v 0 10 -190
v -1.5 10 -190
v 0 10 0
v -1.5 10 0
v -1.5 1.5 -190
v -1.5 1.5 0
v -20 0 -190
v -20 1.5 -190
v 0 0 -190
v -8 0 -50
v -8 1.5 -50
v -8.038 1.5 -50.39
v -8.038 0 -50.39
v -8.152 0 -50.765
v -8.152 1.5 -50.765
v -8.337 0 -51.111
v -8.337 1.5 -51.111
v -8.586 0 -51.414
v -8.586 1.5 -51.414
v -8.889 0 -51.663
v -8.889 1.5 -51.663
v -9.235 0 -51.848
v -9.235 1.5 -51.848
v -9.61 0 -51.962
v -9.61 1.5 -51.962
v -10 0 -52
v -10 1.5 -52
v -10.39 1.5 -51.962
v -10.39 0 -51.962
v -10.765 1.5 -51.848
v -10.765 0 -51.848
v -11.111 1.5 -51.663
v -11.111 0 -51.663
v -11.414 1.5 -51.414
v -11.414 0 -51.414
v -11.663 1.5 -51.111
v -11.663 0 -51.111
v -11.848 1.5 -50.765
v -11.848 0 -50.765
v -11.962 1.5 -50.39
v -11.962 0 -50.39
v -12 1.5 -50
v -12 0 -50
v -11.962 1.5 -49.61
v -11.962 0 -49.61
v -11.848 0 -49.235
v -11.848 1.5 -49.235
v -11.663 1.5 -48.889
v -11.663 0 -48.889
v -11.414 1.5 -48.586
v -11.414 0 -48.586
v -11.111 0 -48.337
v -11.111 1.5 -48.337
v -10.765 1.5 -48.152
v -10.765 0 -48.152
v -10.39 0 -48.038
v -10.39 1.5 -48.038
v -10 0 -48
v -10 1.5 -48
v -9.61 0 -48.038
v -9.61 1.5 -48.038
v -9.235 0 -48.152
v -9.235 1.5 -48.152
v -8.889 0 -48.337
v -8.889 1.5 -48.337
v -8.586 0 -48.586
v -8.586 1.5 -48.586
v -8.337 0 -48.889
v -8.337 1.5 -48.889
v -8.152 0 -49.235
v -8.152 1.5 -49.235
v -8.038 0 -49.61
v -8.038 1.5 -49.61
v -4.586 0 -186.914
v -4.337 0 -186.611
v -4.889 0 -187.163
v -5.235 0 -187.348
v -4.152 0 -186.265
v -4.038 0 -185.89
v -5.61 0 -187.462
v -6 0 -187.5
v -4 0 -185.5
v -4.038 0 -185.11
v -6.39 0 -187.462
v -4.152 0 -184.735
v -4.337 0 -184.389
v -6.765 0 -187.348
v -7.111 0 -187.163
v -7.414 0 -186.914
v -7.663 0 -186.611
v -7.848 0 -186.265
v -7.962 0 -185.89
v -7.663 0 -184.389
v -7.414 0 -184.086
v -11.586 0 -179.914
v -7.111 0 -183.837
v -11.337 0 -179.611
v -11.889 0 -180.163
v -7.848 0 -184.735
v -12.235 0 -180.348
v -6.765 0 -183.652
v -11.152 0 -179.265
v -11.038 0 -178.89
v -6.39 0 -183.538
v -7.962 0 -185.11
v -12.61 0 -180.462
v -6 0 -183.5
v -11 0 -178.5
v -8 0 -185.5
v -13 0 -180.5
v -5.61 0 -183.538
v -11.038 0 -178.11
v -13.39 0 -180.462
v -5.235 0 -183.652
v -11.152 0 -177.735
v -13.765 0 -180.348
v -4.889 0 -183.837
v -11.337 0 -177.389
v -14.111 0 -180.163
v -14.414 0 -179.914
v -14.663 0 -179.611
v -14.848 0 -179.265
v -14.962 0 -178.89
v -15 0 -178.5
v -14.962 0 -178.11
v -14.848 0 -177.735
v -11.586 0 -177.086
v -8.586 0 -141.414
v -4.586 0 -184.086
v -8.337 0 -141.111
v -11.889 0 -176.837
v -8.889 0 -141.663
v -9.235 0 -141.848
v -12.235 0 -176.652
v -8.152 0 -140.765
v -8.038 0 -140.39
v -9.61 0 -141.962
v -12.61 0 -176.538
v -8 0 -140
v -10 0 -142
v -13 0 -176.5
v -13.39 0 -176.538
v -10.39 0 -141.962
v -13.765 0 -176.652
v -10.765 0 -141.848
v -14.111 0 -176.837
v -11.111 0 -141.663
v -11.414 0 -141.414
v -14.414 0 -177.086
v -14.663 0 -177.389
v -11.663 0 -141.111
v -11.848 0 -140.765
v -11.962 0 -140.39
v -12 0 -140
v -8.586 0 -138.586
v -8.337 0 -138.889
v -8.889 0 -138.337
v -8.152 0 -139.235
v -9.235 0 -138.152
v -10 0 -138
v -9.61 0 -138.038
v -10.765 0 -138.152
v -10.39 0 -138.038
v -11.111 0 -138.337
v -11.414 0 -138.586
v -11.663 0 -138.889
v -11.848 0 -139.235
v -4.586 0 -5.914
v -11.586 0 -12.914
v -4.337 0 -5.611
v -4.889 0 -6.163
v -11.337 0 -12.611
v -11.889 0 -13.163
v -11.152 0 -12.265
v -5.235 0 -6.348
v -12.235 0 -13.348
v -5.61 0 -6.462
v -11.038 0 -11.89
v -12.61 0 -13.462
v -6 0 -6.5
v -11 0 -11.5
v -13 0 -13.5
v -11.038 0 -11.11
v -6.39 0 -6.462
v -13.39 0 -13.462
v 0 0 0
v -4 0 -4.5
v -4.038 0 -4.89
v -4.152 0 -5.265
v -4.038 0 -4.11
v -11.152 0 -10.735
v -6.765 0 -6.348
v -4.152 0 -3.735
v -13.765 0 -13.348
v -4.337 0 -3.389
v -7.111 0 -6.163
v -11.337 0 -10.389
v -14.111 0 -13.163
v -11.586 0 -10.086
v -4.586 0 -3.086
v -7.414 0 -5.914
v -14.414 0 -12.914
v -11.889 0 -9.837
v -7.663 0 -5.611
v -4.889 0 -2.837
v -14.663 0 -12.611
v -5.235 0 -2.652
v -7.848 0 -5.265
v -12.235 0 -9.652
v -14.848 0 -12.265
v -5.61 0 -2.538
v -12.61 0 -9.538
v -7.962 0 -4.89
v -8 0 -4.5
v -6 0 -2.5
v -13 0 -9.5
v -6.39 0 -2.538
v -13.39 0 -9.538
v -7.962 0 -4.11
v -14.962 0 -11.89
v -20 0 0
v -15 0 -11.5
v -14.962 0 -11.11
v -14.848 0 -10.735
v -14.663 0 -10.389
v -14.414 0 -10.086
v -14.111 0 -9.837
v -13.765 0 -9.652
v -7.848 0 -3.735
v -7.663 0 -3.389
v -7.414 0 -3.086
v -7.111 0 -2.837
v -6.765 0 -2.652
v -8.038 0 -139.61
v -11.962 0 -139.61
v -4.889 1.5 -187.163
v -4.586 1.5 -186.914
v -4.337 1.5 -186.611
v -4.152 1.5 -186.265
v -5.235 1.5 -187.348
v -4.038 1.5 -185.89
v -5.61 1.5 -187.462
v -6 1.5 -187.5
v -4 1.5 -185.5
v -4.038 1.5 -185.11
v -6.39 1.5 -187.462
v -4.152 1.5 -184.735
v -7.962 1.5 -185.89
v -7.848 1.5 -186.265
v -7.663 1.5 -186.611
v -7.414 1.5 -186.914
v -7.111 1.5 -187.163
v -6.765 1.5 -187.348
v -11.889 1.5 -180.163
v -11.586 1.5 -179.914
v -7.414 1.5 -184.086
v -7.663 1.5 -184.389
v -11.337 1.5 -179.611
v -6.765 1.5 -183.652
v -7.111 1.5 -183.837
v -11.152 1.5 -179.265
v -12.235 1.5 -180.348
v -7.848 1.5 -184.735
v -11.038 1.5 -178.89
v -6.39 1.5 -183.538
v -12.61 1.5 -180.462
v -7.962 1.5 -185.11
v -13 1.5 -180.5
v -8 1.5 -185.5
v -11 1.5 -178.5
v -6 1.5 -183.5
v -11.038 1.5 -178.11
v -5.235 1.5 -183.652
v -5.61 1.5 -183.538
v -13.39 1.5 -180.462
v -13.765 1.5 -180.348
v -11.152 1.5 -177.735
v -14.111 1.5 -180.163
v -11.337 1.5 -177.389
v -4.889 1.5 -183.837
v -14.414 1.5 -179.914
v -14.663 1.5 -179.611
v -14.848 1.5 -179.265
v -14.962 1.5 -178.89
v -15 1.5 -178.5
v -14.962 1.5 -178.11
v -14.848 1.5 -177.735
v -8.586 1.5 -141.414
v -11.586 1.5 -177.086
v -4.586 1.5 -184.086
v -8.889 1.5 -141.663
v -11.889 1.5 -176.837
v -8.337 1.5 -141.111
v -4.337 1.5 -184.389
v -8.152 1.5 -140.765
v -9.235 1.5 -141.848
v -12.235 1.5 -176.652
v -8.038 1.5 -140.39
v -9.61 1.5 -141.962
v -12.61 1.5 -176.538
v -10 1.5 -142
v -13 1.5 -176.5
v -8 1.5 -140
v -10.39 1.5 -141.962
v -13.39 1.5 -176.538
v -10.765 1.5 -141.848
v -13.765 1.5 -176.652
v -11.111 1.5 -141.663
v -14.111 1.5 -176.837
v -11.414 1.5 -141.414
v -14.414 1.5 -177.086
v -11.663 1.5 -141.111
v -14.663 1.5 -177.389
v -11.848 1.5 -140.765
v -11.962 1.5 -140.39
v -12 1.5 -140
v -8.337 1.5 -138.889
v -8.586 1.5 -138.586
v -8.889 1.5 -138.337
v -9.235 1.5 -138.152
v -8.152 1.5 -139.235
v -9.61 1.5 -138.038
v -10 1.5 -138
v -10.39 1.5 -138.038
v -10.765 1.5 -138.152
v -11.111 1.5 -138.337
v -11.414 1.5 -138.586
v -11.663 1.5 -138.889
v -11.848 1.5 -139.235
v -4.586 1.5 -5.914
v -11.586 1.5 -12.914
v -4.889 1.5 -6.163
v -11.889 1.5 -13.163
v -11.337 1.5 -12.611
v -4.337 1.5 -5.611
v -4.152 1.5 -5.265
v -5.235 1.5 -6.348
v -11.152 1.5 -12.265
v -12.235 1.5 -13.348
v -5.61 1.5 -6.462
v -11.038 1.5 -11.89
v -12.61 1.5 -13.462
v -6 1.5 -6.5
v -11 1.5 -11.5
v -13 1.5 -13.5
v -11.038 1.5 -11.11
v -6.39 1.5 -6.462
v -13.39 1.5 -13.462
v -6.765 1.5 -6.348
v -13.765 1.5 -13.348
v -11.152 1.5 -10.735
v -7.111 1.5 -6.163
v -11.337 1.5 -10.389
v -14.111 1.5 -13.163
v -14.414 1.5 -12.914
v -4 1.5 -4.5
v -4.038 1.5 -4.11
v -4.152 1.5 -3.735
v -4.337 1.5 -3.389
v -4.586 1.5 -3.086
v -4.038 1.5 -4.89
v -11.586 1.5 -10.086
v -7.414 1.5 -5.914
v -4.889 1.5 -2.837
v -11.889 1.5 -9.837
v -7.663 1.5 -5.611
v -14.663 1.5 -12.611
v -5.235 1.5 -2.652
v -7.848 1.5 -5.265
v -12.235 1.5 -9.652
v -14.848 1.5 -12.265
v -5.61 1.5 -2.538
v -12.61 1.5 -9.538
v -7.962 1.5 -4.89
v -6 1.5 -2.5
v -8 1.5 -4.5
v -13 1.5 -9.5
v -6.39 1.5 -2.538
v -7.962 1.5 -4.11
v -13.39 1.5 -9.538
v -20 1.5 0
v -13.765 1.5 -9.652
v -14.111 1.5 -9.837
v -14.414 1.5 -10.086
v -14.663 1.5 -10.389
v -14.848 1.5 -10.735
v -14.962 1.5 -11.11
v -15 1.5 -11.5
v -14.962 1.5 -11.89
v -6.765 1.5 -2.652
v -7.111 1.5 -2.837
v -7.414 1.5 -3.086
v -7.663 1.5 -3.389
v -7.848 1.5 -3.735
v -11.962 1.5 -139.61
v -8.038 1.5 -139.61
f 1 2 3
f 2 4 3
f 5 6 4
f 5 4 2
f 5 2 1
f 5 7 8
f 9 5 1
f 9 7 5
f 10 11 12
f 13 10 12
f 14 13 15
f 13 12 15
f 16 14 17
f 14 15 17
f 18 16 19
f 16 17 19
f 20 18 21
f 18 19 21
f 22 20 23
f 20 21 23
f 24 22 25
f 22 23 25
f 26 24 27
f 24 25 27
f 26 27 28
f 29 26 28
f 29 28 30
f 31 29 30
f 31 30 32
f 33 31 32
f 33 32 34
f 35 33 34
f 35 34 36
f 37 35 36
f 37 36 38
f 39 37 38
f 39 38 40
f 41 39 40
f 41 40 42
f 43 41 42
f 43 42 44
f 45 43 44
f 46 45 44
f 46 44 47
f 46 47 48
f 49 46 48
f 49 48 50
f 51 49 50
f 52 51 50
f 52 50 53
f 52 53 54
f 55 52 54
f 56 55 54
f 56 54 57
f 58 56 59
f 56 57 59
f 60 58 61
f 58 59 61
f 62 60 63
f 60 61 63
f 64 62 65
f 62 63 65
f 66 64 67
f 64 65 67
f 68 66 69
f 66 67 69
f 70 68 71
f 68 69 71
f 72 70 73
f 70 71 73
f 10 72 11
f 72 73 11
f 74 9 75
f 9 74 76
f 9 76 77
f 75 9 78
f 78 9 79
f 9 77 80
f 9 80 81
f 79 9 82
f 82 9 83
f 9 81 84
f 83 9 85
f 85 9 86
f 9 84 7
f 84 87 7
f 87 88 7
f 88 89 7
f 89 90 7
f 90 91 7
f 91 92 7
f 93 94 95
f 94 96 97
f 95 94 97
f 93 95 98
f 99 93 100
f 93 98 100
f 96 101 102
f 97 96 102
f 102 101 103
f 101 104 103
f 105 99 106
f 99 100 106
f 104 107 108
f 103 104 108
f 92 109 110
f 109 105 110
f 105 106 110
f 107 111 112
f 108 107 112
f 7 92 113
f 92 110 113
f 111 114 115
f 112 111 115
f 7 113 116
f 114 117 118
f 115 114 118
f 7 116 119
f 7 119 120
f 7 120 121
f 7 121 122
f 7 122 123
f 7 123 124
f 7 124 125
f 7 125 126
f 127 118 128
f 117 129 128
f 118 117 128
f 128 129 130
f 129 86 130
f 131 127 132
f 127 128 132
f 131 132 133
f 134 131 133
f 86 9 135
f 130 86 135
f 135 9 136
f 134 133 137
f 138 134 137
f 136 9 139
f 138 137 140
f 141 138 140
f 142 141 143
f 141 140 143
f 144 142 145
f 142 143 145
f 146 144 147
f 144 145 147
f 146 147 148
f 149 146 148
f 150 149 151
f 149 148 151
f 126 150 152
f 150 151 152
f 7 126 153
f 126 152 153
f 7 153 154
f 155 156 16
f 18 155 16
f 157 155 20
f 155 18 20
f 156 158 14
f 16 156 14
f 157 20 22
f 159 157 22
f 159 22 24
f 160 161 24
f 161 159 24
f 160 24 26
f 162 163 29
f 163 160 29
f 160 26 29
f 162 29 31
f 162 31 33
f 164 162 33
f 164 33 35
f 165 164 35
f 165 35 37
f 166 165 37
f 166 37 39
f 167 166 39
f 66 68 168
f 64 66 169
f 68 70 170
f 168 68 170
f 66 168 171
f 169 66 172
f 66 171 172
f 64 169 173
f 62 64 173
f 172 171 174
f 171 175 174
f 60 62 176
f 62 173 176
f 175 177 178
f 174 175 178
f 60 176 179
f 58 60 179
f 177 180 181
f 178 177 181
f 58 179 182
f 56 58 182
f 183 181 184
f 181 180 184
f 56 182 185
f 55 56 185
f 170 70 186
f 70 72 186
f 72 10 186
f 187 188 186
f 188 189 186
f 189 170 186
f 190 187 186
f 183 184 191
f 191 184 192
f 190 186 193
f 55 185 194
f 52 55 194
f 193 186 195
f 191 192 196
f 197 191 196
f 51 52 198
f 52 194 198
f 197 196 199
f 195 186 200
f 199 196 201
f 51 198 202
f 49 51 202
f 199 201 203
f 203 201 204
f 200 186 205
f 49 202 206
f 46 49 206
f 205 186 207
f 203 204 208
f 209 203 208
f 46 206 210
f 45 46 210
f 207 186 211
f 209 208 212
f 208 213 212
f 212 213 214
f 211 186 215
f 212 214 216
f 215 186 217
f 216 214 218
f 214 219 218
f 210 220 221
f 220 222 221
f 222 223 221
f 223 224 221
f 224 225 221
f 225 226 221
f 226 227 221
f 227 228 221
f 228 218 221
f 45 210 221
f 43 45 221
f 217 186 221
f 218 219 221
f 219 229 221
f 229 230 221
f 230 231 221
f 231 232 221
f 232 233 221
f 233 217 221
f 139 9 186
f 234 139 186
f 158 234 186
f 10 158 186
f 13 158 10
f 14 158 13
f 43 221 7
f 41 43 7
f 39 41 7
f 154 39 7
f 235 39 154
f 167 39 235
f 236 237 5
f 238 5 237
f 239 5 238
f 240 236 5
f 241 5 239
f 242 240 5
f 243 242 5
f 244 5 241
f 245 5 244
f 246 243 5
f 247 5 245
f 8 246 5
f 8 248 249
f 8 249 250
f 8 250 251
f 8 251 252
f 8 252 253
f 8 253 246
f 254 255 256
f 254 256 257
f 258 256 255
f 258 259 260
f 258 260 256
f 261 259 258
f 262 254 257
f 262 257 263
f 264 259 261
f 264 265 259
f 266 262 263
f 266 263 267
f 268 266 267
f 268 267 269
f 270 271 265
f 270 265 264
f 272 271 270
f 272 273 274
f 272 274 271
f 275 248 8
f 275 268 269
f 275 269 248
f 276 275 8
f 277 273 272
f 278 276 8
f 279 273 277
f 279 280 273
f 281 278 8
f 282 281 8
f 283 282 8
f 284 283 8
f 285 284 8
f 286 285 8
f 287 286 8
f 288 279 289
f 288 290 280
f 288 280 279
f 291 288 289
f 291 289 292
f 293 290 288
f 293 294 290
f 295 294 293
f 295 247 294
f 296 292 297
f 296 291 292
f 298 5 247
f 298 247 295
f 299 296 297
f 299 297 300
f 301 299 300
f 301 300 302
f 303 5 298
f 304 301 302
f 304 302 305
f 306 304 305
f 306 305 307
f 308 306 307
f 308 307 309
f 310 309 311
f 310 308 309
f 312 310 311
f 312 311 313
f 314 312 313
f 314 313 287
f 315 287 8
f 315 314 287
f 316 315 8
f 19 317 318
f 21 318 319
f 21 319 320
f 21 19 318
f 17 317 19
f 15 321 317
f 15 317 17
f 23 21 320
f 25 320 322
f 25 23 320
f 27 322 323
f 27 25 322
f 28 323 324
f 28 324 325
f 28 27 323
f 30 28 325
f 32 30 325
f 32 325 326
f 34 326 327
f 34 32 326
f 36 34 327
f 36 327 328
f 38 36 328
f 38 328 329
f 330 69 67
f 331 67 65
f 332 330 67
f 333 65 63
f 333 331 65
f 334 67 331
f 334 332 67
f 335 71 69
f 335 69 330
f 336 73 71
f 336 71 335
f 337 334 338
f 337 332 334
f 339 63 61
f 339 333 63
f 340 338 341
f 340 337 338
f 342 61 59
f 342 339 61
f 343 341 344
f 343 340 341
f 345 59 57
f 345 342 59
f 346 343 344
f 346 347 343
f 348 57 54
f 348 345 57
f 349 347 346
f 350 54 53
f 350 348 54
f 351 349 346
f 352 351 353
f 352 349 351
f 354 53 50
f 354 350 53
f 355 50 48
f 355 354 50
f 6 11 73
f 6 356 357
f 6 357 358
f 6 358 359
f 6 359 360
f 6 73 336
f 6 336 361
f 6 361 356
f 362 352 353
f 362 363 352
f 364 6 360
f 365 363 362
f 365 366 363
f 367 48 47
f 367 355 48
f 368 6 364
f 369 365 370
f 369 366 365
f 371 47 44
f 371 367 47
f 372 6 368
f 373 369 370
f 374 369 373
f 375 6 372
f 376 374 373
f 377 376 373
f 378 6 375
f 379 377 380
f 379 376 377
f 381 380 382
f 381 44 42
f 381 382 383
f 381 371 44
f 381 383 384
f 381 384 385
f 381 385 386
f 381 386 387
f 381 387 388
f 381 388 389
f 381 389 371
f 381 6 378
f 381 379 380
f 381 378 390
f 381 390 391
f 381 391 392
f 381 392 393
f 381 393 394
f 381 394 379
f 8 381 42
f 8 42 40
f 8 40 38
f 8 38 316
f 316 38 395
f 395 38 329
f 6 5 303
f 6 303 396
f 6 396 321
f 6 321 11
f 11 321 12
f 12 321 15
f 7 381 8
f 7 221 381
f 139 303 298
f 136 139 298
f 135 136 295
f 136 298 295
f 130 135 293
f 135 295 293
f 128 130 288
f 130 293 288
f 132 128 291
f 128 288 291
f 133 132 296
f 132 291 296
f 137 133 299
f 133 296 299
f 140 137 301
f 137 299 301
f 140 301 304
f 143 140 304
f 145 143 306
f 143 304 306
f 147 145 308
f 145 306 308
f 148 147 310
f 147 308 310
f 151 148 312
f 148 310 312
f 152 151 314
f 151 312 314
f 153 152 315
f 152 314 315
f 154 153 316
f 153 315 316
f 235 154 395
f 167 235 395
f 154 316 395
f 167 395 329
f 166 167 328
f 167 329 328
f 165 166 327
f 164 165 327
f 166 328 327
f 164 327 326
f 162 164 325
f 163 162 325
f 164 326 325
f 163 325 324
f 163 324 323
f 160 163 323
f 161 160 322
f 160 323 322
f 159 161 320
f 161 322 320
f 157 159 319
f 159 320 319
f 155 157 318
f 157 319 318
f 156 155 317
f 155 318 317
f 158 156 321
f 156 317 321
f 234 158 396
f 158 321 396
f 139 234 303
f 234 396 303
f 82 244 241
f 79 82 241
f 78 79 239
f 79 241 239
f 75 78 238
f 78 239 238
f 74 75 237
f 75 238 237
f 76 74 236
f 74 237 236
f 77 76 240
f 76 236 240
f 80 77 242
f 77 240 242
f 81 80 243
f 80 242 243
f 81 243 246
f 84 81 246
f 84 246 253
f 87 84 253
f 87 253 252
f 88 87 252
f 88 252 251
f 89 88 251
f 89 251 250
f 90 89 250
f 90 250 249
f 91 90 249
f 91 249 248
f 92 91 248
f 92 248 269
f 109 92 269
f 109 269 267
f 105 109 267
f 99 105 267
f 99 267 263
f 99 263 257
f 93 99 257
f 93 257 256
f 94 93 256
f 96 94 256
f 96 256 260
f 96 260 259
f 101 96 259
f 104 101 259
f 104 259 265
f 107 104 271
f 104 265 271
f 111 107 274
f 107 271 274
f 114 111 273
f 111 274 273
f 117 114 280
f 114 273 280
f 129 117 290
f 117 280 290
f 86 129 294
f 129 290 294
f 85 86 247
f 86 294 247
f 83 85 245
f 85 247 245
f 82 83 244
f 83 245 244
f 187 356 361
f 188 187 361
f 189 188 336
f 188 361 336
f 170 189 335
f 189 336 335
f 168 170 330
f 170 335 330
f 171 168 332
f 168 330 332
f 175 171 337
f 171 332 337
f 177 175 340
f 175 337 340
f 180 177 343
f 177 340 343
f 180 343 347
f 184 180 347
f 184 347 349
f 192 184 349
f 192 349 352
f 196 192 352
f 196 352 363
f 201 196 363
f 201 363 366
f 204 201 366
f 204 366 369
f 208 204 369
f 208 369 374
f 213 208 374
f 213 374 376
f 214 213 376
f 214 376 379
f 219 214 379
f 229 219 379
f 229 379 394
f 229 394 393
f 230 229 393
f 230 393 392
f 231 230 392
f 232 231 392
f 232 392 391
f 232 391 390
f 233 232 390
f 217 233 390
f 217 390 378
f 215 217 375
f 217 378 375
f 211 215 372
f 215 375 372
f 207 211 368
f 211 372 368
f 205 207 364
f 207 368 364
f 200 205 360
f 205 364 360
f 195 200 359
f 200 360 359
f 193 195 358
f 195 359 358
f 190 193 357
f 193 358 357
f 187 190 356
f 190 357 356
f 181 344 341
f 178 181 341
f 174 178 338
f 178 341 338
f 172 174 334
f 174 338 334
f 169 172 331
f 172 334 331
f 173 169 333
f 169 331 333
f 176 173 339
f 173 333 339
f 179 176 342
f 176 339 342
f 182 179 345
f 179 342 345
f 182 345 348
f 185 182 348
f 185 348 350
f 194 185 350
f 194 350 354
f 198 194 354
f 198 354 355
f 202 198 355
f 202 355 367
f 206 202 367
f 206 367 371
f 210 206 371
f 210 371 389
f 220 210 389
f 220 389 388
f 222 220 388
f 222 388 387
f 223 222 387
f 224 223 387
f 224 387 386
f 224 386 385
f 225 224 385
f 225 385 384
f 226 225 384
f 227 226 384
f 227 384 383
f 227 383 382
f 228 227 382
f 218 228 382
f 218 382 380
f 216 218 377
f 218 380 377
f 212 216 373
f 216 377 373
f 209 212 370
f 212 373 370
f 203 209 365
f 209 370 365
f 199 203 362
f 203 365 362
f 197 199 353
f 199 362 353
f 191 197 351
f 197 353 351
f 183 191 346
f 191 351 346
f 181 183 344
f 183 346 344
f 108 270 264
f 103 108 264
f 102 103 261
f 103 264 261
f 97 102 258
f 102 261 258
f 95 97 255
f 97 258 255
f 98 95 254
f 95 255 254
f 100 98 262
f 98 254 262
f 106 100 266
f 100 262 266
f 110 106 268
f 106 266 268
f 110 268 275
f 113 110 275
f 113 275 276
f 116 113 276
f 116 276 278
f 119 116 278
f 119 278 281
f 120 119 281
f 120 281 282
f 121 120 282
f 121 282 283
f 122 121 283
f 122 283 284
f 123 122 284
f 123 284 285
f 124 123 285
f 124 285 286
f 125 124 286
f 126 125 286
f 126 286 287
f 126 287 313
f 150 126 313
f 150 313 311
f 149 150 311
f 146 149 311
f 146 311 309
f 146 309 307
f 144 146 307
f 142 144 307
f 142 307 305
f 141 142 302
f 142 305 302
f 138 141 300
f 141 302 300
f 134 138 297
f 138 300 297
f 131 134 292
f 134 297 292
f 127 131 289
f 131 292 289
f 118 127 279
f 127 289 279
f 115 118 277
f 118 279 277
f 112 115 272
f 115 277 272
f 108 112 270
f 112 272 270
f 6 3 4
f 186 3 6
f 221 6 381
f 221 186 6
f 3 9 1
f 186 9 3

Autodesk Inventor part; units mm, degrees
ref_plane "YZ Plane" through (0, 0, 0) normal (1, 0, 0) x (0, 1, 0)
ref_plane "XZ Plane" through (0, 0, 0) normal (0, 1, 0) x (-1, 0, 0)
ref_plane "XY Plane" through (0, 0, 0) normal (0, 0, 1) x (1, 0, 0)
sketch "Sketch1" plane through (0, 0, 0) normal (0, 1, 0) x (-1, 0, 0)
  line L0 (0, 0) -> (20, 0)
  line L1 (20, 0) -> (20, -190)
  line L2 (20, -190) -> (0, -190)
  line L3 (0, -190) -> (0, 0)
  dimension "d0" = 20
  dimension "d1" = 190
extrude "Extrusion1" add sketch "Sketch1" along normal blind 1.5
sketch "Sketch2" plane through (0, 0, 0) normal (0, -1, 0) x (1, 0, 0)
  line L0 (0, 0) -> (-1.5, 0)
  line L1 (-1.5, 0) -> (-1.5, -190)
  line L2 (-1.5, -190) -> (0, -190)
  line L3 (0, -190) -> (0, 0)
  dimension "d4" = 1.5
  dimension "d5" = 190
extrude "Extrusion2" add sketch "Sketch2" against normal blind 10
sketch "Sketch3" plane through (0, 1.5, 0) normal (0, 1, 0) x (1, 0, 0)
  line L0 (-20, 0) -> (-1.5, 0) projected
  line L1 (-20, 0) -> (-1.5, 0)
  line L2 (-1.5, 0) -> (-1.5, 18.5)
  line L3 (-1.5, 18.5) -> (-20, 18.5)
  line L4 (-20, 18.5) -> (-20, 0)
  line L5 (-20, 190) -> (-1.5, 190)
  line L6 (-1.5, 190) -> (-1.5, 171.5)
  line L7 (-1.5, 171.5) -> (-20, 171.5)
  line L8 (-20, 171.5) -> (-20, 190)
  line L9 (-20, 171.5) -> (-13, 171.5)
  line L10 (-13, 171.5) -> (-13, 178.5)
  line L11 (-13, 178.5) -> (-20, 178.5)
  line L12 (-20, 178.5) -> (-20, 171.5)
  line L13 (-20, 171.5) -> (-6, 171.5)
  line L14 (-6, 171.5) -> (-6, 185.5)
  line L15 (-6, 185.5) -> (-20, 185.5)
  line L16 (-20, 185.5) -> (-20, 171.5)
  circle A0 centre (-6, 185.5) radius 2
  circle A1 centre (-13, 178.5) radius 2
  line L17 (-20, 18.5) -> (-13, 18.5)
  line L18 (-13, 18.5) -> (-13, 11.5)
  line L19 (-13, 11.5) -> (-20, 11.5)
  line L20 (-20, 11.5) -> (-20, 18.5)
  line L21 (-20, 18.5) -> (-6, 18.5)
  line L22 (-6, 18.5) -> (-6, 4.5)
  line L23 (-6, 4.5) -> (-20, 4.5)
  line L24 (-20, 4.5) -> (-20, 18.5)
  circle A2 centre (-13, 11.5) radius 2
  circle A3 centre (-6, 4.5) radius 2
  line L25 (-20, 190) -> (-20, 140)
  line L26 (-20, 140) -> (-20, 50)
  line L27 (-20, 140) -> (-10, 140)
  line L28 (-10, 140) -> (-10, 50)
  line L29 (-10, 50) -> (-20, 50)
  line L30 (-20, 50) -> (-20, 140)
  circle A4 centre (-10, 140) radius 2
  circle A5 centre (-10, 50) radius 2
  point P0 (0, 0)
  dimension "d8" = 18.5
  dimension "d9" = 18.5
  dimension "d10" = 18.5
  dimension "d11" = 18.5
  dimension "d12" = 7
  dimension "d13" = 7
  dimension "d14" = 14
  dimension "d15" = 14
  dimension "d16" = 4
  dimension "d17" = 4
  dimension "d18" = 7
  dimension "d19" = 7
  dimension "d20" = 14
  dimension "d21" = 14
  dimension "d22" = 4
  dimension "d23" = 4
  dimension "d26" = 50
  dimension "d27" = 90
  dimension "d28" = 10
  dimension "d29" = 4
  dimension "d30" = 4
extrude "Extrusion3" cut sketch "Sketch3" against normal blind 10 contours A3 L22 L23 | L23 L22 A3 | A2 L18 L19 | L19 L18 A2 | A0 L14 L15 | L15 L14 A0 | A1 L10 L11 | L11 L10 A1 | A4 L28 L27 | L27 L28 A4 | A5 L28 L29 | L29 L28 A5
properties part number "aluminium_profile_1"
